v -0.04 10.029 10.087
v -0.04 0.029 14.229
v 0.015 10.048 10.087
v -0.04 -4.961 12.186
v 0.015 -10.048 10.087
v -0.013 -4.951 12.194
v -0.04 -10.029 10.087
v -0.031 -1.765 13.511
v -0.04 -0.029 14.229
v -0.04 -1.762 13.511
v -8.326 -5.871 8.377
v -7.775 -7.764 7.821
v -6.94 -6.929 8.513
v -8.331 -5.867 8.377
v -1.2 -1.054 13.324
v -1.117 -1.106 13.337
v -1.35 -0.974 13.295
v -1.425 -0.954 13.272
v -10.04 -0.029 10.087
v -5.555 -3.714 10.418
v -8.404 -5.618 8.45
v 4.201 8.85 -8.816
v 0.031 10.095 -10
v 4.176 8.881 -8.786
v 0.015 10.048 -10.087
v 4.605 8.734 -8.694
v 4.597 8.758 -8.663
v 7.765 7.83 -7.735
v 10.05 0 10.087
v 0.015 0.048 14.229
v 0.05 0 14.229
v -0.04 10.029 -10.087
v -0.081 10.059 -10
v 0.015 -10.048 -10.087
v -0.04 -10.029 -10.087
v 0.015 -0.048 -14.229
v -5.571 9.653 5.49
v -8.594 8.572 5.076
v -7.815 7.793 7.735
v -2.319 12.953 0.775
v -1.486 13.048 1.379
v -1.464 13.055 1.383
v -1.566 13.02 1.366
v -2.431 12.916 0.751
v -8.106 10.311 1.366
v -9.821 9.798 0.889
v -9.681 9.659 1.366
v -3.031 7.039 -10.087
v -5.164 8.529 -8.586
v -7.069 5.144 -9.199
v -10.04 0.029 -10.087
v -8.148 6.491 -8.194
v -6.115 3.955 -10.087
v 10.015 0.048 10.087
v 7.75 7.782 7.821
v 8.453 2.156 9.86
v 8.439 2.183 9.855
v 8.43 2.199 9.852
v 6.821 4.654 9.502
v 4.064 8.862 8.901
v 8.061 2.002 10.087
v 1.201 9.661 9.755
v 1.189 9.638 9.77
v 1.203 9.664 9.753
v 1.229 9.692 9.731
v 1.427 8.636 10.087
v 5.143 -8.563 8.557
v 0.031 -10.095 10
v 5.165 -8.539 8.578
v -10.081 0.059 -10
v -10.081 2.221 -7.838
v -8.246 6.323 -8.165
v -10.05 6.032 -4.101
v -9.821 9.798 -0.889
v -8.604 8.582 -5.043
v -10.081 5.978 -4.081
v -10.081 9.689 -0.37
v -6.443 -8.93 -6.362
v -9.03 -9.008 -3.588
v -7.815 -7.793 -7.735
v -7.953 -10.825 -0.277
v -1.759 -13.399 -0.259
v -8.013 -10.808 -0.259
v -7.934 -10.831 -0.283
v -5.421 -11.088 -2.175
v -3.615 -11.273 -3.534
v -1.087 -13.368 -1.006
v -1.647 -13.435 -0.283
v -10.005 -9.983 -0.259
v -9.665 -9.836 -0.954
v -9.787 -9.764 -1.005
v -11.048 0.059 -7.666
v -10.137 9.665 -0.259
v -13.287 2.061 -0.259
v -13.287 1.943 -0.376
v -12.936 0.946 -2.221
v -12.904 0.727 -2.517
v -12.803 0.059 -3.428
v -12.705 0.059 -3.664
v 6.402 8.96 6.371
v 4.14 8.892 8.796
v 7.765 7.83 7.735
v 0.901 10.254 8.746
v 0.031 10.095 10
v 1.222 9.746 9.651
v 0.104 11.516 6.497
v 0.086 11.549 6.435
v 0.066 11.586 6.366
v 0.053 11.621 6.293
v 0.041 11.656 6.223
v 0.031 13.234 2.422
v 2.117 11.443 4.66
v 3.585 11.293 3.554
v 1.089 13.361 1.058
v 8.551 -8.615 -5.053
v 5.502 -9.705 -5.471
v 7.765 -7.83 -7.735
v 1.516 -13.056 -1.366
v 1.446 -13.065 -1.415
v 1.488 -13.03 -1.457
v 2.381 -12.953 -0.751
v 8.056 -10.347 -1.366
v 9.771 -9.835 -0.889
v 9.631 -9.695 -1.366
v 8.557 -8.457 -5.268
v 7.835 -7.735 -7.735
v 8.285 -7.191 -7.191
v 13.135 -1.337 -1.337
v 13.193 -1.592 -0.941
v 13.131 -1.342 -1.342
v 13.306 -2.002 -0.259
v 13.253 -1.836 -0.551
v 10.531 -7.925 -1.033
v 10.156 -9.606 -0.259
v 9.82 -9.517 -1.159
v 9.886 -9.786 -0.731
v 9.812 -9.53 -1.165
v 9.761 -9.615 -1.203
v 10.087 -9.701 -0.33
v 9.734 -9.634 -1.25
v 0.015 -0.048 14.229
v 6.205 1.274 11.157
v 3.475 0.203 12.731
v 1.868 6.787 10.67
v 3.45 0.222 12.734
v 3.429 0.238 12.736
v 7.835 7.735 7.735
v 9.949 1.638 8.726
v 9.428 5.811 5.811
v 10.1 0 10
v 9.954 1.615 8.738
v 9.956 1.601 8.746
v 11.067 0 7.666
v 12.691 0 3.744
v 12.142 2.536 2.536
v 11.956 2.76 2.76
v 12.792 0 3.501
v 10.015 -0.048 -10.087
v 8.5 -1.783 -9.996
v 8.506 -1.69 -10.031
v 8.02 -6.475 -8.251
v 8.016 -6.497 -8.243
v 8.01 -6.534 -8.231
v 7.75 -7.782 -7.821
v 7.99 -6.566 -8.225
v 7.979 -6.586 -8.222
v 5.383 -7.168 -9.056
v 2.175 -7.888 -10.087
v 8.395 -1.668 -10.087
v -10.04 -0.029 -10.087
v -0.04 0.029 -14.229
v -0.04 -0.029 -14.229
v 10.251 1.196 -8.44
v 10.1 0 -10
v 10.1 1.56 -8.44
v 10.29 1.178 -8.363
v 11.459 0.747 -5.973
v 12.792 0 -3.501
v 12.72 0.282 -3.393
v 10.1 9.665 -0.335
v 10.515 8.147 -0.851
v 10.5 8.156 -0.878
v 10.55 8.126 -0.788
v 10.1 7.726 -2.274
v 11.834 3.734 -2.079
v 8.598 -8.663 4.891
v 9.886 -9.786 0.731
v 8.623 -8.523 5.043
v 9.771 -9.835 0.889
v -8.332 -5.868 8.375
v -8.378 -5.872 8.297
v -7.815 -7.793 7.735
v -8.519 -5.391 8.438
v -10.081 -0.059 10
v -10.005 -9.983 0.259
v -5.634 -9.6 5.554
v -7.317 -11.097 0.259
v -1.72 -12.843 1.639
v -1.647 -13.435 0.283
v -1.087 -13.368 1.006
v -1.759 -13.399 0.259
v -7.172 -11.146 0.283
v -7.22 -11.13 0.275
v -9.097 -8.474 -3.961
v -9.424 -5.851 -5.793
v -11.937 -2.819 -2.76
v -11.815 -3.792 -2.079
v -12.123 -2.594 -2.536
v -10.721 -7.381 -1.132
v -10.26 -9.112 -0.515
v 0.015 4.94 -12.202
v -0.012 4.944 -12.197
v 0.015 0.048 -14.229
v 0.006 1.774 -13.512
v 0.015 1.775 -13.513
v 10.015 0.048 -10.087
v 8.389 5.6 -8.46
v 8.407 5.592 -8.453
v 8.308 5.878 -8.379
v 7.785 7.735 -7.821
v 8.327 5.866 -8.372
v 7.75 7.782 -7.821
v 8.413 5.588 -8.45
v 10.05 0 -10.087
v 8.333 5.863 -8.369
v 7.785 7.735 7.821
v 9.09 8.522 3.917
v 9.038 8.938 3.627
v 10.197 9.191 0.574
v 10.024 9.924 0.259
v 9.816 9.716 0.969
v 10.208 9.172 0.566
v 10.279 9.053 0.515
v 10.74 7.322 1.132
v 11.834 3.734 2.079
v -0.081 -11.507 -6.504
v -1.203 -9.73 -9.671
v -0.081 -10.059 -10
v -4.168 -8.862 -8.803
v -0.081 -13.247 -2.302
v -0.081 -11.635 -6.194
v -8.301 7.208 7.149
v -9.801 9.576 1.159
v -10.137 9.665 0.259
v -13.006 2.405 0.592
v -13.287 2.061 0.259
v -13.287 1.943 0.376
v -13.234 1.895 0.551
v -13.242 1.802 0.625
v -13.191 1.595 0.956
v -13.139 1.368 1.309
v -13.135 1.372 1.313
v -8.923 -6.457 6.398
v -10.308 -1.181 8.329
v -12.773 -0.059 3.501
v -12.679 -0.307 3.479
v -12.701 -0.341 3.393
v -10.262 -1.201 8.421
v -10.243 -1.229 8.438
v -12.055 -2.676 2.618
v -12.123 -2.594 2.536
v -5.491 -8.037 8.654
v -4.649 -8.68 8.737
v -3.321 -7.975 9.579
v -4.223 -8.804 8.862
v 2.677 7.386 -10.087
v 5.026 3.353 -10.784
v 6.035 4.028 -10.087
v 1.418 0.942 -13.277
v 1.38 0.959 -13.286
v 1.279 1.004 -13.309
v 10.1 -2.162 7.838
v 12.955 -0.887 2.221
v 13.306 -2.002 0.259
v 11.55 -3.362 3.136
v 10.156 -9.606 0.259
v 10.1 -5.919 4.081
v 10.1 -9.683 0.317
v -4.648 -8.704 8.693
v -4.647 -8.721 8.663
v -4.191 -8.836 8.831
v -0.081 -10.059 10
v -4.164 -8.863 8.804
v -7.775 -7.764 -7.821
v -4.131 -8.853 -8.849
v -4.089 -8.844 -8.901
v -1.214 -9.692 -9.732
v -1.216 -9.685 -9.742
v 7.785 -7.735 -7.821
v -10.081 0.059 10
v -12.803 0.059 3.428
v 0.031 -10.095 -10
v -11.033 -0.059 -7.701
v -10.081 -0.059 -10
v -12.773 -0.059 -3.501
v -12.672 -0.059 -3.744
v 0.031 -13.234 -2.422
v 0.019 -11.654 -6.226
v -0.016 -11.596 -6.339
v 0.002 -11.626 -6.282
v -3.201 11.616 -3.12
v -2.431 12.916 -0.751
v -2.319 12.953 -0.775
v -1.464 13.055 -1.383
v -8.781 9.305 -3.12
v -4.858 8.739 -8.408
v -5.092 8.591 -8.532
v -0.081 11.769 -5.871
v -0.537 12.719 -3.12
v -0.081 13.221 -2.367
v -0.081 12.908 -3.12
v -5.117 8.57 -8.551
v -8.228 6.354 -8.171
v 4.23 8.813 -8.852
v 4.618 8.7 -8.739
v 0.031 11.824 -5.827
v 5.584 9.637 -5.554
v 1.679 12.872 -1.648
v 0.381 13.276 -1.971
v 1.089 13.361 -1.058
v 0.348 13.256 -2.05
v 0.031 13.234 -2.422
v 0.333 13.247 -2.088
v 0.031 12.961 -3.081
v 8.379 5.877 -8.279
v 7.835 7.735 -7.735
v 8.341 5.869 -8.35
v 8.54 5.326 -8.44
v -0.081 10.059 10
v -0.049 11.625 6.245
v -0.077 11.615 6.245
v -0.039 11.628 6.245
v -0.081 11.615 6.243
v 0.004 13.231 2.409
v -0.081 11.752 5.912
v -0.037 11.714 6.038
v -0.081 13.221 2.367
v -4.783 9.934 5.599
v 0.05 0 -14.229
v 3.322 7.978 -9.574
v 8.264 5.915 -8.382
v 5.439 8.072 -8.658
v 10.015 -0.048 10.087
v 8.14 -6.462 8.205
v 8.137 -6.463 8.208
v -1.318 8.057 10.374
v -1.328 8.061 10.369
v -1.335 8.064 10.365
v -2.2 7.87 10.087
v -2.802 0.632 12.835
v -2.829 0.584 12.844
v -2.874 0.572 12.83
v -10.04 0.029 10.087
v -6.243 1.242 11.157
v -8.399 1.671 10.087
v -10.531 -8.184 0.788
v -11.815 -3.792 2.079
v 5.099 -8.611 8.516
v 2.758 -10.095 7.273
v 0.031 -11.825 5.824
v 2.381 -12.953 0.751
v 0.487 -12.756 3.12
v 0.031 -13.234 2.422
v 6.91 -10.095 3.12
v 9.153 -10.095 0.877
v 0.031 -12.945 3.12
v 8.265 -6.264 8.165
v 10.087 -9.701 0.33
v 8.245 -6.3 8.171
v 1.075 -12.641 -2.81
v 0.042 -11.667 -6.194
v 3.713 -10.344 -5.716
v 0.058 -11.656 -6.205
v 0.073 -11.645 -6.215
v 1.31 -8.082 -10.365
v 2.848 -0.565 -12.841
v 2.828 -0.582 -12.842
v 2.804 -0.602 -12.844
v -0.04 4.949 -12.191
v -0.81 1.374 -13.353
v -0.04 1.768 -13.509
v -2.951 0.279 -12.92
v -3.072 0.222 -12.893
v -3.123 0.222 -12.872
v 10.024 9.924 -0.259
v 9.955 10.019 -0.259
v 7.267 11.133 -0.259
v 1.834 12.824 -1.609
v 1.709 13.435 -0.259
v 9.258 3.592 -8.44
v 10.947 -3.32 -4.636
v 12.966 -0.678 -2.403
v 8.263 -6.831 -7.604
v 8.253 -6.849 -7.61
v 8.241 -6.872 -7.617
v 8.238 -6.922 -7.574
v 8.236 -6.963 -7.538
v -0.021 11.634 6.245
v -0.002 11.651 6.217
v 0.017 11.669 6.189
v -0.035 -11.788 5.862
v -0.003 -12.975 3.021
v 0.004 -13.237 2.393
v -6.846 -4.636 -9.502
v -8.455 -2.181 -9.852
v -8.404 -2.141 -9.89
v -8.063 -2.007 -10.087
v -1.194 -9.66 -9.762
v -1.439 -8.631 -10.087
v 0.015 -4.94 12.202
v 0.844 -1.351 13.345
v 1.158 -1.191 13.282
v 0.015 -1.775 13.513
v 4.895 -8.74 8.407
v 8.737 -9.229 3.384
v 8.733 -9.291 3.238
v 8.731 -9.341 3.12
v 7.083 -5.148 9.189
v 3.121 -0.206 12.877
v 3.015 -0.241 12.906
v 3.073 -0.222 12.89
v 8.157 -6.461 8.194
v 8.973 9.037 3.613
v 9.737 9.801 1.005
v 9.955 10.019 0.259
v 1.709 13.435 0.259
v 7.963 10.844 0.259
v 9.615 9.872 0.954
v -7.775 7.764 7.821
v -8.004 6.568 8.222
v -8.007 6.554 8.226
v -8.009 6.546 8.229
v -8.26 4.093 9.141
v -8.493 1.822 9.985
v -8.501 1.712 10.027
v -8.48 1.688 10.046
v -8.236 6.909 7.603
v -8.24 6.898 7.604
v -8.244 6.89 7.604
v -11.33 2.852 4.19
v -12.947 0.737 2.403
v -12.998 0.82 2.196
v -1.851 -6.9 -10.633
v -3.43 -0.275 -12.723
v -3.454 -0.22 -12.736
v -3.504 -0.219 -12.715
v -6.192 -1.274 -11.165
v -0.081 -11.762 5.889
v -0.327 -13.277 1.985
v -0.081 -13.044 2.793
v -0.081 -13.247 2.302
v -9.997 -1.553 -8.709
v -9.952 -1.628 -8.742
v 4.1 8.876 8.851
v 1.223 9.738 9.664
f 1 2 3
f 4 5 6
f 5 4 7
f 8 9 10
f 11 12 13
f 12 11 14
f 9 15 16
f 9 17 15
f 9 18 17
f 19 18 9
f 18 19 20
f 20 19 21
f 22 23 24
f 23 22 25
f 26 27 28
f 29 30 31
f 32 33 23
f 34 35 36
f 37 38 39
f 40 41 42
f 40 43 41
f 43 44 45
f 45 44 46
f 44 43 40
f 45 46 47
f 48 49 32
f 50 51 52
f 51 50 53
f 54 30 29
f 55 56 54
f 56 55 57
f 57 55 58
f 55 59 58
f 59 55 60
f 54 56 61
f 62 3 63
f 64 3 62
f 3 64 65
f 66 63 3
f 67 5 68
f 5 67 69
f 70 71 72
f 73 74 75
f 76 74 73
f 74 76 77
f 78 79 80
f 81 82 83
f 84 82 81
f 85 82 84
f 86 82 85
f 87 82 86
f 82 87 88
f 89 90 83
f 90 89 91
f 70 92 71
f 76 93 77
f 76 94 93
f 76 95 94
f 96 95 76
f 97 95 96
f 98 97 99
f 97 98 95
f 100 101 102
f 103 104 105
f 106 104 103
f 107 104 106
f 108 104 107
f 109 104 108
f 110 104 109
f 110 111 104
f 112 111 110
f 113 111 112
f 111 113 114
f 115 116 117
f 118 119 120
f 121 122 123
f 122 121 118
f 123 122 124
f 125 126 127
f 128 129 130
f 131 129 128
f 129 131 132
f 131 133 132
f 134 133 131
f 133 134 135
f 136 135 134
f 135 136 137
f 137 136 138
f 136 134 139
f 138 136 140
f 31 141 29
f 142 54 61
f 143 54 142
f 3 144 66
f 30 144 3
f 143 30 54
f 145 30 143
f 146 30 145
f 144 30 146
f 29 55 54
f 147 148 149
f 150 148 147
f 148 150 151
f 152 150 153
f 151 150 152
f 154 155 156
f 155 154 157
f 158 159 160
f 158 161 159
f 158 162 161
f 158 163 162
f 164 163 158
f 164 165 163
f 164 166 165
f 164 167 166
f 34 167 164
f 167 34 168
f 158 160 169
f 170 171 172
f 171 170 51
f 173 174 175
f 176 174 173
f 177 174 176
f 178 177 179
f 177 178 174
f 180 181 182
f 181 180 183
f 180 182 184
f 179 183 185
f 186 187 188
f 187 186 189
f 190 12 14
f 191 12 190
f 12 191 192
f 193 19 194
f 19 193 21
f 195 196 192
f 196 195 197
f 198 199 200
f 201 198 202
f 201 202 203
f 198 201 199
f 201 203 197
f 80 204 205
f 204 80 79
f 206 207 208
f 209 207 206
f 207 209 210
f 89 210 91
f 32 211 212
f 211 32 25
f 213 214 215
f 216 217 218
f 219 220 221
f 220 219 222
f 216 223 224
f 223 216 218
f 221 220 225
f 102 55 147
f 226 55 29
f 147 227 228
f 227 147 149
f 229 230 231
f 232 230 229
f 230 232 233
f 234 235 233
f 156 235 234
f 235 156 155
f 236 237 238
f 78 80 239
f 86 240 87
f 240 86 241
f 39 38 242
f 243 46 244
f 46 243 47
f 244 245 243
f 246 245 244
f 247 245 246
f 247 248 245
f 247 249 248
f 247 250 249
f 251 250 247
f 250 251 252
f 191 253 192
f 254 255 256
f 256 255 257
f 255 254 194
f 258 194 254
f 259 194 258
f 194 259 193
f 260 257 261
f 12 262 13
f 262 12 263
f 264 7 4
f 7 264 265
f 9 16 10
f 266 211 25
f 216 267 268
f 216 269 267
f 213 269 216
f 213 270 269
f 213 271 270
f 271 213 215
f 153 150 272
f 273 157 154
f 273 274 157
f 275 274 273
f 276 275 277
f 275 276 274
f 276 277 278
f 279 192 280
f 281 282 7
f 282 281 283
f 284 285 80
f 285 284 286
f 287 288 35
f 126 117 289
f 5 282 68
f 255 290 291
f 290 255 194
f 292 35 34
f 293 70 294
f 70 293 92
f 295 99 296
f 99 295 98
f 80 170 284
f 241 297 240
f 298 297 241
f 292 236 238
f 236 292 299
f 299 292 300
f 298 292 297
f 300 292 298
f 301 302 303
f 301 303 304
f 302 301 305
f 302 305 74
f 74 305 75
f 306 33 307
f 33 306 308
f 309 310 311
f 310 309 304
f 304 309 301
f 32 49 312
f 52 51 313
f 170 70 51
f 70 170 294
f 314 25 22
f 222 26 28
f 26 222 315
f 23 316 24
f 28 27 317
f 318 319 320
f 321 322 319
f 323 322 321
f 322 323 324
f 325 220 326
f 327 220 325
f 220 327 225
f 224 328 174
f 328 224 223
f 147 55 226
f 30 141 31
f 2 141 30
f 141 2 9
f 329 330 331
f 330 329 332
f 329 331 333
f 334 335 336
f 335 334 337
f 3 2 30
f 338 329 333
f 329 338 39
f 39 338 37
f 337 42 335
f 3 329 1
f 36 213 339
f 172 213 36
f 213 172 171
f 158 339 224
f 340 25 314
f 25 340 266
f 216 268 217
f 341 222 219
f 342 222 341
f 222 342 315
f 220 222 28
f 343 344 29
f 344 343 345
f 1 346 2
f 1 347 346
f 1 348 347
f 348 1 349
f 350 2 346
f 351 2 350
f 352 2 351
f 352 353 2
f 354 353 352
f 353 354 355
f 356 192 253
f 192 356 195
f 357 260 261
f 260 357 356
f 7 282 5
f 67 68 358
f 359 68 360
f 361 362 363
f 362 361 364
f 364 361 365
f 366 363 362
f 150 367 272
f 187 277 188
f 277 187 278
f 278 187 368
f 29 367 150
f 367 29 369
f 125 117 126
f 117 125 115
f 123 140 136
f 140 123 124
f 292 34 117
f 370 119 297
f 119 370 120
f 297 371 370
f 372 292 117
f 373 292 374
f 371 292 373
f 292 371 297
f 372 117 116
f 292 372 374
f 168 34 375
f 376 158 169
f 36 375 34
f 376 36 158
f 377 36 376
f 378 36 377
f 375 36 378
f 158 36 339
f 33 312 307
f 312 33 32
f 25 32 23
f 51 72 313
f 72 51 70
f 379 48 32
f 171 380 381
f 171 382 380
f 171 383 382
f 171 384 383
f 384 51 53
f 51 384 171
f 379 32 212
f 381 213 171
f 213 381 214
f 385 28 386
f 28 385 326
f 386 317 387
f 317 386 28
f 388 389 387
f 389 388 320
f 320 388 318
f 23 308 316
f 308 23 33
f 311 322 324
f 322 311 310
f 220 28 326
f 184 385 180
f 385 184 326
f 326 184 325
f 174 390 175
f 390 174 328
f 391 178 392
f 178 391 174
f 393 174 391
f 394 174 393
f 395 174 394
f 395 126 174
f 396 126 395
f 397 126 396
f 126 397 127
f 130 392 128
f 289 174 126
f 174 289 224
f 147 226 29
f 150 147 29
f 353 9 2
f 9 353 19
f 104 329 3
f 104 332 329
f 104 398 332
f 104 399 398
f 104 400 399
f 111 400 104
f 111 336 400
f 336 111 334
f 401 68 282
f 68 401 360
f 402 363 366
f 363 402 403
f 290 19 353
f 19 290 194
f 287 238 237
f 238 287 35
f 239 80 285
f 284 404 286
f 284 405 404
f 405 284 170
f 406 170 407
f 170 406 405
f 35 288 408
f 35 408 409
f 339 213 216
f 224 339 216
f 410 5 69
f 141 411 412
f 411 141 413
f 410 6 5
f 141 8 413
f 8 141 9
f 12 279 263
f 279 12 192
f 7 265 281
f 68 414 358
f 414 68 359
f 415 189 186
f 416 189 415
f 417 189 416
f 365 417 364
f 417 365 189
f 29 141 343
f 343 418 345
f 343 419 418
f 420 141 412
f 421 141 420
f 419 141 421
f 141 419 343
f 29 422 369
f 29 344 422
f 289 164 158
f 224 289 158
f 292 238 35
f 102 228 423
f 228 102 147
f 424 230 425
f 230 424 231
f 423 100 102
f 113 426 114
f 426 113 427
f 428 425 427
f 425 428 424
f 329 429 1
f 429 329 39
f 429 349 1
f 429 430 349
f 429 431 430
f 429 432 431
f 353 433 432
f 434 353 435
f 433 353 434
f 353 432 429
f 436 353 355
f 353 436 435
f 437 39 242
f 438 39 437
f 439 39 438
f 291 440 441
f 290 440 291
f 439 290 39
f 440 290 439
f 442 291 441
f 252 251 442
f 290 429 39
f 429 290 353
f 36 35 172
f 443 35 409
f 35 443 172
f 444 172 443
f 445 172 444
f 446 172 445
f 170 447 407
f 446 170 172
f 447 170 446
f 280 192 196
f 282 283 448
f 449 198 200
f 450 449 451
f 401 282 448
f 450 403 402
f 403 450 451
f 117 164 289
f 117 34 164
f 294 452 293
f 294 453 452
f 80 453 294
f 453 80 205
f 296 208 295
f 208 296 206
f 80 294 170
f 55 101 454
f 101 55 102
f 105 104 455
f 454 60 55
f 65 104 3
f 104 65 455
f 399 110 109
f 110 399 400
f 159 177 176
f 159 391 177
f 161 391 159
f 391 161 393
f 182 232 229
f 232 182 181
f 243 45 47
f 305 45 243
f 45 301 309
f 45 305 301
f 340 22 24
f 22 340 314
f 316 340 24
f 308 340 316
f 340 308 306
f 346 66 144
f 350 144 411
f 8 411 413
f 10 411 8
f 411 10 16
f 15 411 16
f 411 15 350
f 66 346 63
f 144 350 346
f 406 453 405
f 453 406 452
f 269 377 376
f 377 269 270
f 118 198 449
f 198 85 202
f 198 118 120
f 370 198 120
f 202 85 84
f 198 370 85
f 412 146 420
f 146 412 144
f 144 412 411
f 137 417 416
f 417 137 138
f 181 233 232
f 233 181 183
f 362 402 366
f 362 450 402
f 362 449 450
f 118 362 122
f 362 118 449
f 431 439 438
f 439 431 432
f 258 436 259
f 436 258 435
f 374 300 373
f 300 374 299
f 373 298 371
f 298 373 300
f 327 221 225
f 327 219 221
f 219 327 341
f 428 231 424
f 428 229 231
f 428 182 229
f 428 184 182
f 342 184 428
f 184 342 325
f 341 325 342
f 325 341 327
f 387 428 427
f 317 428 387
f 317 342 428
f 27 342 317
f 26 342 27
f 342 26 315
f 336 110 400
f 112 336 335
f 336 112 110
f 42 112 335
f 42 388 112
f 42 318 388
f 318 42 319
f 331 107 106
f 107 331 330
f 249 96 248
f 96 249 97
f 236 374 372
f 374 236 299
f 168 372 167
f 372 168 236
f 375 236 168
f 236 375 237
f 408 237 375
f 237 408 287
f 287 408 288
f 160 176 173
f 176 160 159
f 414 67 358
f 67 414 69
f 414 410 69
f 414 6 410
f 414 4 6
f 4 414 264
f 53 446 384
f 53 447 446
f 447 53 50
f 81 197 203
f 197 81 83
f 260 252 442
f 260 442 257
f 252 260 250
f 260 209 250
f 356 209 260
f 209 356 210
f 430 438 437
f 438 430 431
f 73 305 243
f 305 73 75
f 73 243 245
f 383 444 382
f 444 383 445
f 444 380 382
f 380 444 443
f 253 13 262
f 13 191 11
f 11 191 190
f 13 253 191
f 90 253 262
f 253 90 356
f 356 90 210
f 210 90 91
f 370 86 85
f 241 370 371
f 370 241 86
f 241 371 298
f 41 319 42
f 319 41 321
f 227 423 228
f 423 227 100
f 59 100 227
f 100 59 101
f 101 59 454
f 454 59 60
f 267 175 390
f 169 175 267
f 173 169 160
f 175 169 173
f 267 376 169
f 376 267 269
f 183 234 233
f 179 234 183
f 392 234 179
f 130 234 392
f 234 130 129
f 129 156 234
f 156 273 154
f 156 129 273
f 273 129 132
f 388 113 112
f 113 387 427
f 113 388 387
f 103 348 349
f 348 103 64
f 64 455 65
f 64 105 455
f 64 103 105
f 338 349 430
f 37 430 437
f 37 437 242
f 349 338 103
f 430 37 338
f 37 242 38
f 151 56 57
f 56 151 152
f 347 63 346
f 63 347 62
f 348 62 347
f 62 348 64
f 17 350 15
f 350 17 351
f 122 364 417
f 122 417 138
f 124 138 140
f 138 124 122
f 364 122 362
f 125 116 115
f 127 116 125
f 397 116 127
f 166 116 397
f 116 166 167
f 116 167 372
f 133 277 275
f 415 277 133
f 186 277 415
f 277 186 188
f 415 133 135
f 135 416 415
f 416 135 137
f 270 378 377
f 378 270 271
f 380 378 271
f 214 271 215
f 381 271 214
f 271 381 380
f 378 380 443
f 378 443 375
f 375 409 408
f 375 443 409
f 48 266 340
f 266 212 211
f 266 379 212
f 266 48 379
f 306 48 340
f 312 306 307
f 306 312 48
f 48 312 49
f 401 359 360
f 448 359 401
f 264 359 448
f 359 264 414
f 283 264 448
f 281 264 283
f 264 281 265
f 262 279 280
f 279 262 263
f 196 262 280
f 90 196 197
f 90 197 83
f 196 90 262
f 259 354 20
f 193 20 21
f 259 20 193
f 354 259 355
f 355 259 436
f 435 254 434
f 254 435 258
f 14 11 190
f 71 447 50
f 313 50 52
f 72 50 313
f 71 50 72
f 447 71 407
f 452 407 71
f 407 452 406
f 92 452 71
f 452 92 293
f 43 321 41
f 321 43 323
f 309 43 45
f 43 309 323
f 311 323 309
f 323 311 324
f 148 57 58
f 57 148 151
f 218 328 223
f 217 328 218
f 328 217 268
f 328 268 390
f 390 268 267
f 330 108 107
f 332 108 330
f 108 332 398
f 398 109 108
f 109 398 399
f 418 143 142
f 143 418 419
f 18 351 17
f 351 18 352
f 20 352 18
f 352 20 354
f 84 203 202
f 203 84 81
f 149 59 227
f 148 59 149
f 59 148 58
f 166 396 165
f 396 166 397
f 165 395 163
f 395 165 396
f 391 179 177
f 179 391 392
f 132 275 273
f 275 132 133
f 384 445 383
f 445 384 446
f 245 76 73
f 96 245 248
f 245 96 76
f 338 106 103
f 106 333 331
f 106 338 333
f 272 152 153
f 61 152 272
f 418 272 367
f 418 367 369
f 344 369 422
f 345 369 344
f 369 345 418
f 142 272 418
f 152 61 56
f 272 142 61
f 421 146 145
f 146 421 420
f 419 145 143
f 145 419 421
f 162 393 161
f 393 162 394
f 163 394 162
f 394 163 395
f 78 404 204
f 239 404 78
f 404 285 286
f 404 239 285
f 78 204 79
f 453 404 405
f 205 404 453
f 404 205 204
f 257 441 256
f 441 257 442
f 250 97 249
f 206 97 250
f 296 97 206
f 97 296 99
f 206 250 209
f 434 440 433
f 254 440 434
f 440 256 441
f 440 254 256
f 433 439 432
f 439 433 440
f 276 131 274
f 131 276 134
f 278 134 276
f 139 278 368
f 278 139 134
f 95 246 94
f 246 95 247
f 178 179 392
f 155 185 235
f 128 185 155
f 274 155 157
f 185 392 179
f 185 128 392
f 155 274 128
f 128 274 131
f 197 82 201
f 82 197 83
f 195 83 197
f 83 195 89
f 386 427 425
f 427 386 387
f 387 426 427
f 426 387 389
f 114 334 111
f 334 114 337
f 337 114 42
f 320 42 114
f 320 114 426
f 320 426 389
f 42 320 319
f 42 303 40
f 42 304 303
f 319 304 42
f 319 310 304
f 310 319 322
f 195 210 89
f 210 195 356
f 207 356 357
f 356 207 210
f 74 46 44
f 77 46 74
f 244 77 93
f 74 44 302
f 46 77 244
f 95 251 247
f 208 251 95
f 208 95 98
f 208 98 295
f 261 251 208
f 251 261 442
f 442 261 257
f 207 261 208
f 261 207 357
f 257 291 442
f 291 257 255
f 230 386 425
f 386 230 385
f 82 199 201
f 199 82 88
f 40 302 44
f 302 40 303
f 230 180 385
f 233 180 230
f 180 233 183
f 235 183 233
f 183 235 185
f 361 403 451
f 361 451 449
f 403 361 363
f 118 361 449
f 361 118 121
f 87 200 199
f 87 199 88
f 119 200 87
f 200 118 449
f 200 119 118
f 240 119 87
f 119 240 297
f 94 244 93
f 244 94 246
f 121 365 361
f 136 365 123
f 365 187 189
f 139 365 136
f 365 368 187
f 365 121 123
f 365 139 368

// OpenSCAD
// Auto-generated OpenSCAD file

    inner_points = 10*[[-0.9924214082781326, -0.9924214082781341, -0.17378002411811763], [0.9924214082781326, 0.9924214082781341, 0.17378002411811763], [0.667054650053384, -0.46440122556819574, -1.157311364989092], [-0.667054650053384, 0.46440122556819574, 1.157311364989092], [0.7550747262578756, -0.8941091936010968, 0.793996793245786], [-0.7550747262578756, 0.8941091936010968, -0.793996793245786], [-0.2300690411134036, -1.0301291633787866, -0.9412237476167292], [1.173426774062938, 0.3733666517975572, -0.6954616806393638], [-1.173426774062938, -0.3733666517975572, 0.6954616806393638], [0.2300690411134036, 1.0301291633787866, 0.9412237476167292], [1.0055973257142872, -0.9606119297071858, -0.2569021973835781], [-0.0622395927647527, 0.3038494181259564, -1.3797832308725149], [0.0622395927647527, -0.3038494181259564, 1.3797832308725149], [-1.0055973257142872, 0.9606119297071858, 0.2569021973835781], [-0.167829448348651, -1.333978581504743, 0.43855948325578553], [1.2356663668276906, 0.06951723367160068, 0.6843215502331511], [-1.2356663668276906, -0.06951723367160068, -0.6843215502331511], [0.167829448348651, 1.333978581504743, -0.43855948325578553], [0.23501509150537025, -1.2857673109469796, -0.2937467884786382], [1.3205616739713175, -0.20022072848103067, -0.10365988617210997], [-0.590913069413474, -0.3077581997277278, -1.1622493199711124], [0.4946335130524734, 0.7777883827382212, -0.972162417664584], [-0.4946335130524734, -0.7777883827382212, 0.972162417664584], [0.590913069413474, 0.3077581997277278, 1.1622493199711124], [-1.3205616739713175, 0.20022072848103067, 0.10365988617210997], [-0.23501509150537025, 1.2857673109469796, 0.2937467884786382]];

    outer_points = 10*[[-4.5075656706956464e-14, 1.4142135623730676, 2.7968265960010054e-07], [4.5075656706956464e-14, -1.4142135623730676, -2.7968265960010054e-07], [1.4142135623730767, 0.0, 2.27924767087805e-07], [-1.4142135623730767, 0.0, -2.27924767087805e-07], [2.2792476708780058e-07, 2.796826596001042e-07, -1.4142135623730492], [-2.2792476708780058e-07, -2.796826596001042e-07, 1.4142135623730492], [0.9999999999999551, 0.9999999999999805, 3.589326535916713e-07], [1.0000000000000189, -0.9999999999999805, -3.659835677536863e-08], [-1.0000000000000189, 0.9999999999999805, 3.659835677536863e-08], [-0.9999999999999551, -0.9999999999999805, -3.589326535916713e-07], [1.0000001611671354, 1.9776550518352253e-07, -0.9999998388328191], [0.9999998388328386, -1.9776550518352253e-07, 1.0000001611671159], [-0.9999998388328386, 1.9776550518352253e-07, -1.0000001611671159], [-1.0000001611671354, -1.9776550518352253e-07, 0.9999998388328191], [1.6116711653484567e-07, 1.0000001977654855, -0.9999998022344623], [1.611671802814507e-07, -0.9999998022344753, -1.0000001977654724], [-1.611671802814507e-07, 0.9999998022344753, 1.0000001977654724], [-1.6116711653484567e-07, -1.0000001977654855, 0.9999998022344623], [0.7734592049951733, 0.7734592333025242, -0.7734588027192684], [0.7734592049952226, -0.7734589273754727, -0.7734591086463198], [0.7734589556827846, 0.7734589273754727, 0.7734593579587086], [0.7734589556828338, -0.7734592333025242, 0.7734590520316571], [-0.7734589556828338, 0.7734592333025242, -0.7734590520316571], [-0.7734589556827846, -0.7734589273754727, -0.7734593579587086], [-0.7734592049952226, 0.7734589273754727, 0.7734591086463198], [-0.7734592049951733, -0.7734592333025242, 0.7734588027192684]];

    // Convex hull for inner set (I)
    module inner_hull() {
        hull() {
            for (p = inner_points) {
                translate(p) sphere(r=0.1);
            }
        }
    }

    // Convex hull for outer set (O) minus inner hull (O \ I)
    module outer_minus_inner() {
        difference() {
            hull() {
                for (p = outer_points) {
                    translate(p) sphere(r=0.1);
                }
            }
            inner_hull(); // Subtract inner hull
        }
    }

    // Convex hull for outer set (O) minus all translated inner hulls
    module outer_minus_AllTranslationInner() {
        difference() {
            hull() {
                for (p = outer_points) {
                    translate(p) sphere(r=0.1);
                }
            }
            hull() {
                translate([0,0,50]) inner_hull();
                translate([0,0,-50]) inner_hull();
            }; // Subtract translated inner hulls
        }
    }

    // Difference between outer_minus_inner and outer_minus_AllTranslationInner
    module outer_minus_inner_diff() {
        difference() {
            // Outer minus inner
            difference() {
                hull() {
                    for (p = outer_points) {
                        translate(p) sphere(r=0.1);
                    }
                }
                inner_hull();
            }

            // Subtract Outer minus AllTranslationInner
            difference() {
                hull() {
                    for (p = outer_points) {
                        translate(p) sphere(r=0.1);
                    }
                }
                hull() {
                    translate([0,0,50]) inner_hull();
                    translate([0,0,-50]) inner_hull();
                };
            }
        }
    }

    // Rendering all with colors applied
    // color([1, 0, 0, 0.5]) inner_hull(); // Transparent red
    // color([0, 0, 1, 1]) outer_minus_inner(); // Opaque blue
    color([1, 1, 0, 1]) outer_minus_inner_diff(); // Opaque yellow
    
